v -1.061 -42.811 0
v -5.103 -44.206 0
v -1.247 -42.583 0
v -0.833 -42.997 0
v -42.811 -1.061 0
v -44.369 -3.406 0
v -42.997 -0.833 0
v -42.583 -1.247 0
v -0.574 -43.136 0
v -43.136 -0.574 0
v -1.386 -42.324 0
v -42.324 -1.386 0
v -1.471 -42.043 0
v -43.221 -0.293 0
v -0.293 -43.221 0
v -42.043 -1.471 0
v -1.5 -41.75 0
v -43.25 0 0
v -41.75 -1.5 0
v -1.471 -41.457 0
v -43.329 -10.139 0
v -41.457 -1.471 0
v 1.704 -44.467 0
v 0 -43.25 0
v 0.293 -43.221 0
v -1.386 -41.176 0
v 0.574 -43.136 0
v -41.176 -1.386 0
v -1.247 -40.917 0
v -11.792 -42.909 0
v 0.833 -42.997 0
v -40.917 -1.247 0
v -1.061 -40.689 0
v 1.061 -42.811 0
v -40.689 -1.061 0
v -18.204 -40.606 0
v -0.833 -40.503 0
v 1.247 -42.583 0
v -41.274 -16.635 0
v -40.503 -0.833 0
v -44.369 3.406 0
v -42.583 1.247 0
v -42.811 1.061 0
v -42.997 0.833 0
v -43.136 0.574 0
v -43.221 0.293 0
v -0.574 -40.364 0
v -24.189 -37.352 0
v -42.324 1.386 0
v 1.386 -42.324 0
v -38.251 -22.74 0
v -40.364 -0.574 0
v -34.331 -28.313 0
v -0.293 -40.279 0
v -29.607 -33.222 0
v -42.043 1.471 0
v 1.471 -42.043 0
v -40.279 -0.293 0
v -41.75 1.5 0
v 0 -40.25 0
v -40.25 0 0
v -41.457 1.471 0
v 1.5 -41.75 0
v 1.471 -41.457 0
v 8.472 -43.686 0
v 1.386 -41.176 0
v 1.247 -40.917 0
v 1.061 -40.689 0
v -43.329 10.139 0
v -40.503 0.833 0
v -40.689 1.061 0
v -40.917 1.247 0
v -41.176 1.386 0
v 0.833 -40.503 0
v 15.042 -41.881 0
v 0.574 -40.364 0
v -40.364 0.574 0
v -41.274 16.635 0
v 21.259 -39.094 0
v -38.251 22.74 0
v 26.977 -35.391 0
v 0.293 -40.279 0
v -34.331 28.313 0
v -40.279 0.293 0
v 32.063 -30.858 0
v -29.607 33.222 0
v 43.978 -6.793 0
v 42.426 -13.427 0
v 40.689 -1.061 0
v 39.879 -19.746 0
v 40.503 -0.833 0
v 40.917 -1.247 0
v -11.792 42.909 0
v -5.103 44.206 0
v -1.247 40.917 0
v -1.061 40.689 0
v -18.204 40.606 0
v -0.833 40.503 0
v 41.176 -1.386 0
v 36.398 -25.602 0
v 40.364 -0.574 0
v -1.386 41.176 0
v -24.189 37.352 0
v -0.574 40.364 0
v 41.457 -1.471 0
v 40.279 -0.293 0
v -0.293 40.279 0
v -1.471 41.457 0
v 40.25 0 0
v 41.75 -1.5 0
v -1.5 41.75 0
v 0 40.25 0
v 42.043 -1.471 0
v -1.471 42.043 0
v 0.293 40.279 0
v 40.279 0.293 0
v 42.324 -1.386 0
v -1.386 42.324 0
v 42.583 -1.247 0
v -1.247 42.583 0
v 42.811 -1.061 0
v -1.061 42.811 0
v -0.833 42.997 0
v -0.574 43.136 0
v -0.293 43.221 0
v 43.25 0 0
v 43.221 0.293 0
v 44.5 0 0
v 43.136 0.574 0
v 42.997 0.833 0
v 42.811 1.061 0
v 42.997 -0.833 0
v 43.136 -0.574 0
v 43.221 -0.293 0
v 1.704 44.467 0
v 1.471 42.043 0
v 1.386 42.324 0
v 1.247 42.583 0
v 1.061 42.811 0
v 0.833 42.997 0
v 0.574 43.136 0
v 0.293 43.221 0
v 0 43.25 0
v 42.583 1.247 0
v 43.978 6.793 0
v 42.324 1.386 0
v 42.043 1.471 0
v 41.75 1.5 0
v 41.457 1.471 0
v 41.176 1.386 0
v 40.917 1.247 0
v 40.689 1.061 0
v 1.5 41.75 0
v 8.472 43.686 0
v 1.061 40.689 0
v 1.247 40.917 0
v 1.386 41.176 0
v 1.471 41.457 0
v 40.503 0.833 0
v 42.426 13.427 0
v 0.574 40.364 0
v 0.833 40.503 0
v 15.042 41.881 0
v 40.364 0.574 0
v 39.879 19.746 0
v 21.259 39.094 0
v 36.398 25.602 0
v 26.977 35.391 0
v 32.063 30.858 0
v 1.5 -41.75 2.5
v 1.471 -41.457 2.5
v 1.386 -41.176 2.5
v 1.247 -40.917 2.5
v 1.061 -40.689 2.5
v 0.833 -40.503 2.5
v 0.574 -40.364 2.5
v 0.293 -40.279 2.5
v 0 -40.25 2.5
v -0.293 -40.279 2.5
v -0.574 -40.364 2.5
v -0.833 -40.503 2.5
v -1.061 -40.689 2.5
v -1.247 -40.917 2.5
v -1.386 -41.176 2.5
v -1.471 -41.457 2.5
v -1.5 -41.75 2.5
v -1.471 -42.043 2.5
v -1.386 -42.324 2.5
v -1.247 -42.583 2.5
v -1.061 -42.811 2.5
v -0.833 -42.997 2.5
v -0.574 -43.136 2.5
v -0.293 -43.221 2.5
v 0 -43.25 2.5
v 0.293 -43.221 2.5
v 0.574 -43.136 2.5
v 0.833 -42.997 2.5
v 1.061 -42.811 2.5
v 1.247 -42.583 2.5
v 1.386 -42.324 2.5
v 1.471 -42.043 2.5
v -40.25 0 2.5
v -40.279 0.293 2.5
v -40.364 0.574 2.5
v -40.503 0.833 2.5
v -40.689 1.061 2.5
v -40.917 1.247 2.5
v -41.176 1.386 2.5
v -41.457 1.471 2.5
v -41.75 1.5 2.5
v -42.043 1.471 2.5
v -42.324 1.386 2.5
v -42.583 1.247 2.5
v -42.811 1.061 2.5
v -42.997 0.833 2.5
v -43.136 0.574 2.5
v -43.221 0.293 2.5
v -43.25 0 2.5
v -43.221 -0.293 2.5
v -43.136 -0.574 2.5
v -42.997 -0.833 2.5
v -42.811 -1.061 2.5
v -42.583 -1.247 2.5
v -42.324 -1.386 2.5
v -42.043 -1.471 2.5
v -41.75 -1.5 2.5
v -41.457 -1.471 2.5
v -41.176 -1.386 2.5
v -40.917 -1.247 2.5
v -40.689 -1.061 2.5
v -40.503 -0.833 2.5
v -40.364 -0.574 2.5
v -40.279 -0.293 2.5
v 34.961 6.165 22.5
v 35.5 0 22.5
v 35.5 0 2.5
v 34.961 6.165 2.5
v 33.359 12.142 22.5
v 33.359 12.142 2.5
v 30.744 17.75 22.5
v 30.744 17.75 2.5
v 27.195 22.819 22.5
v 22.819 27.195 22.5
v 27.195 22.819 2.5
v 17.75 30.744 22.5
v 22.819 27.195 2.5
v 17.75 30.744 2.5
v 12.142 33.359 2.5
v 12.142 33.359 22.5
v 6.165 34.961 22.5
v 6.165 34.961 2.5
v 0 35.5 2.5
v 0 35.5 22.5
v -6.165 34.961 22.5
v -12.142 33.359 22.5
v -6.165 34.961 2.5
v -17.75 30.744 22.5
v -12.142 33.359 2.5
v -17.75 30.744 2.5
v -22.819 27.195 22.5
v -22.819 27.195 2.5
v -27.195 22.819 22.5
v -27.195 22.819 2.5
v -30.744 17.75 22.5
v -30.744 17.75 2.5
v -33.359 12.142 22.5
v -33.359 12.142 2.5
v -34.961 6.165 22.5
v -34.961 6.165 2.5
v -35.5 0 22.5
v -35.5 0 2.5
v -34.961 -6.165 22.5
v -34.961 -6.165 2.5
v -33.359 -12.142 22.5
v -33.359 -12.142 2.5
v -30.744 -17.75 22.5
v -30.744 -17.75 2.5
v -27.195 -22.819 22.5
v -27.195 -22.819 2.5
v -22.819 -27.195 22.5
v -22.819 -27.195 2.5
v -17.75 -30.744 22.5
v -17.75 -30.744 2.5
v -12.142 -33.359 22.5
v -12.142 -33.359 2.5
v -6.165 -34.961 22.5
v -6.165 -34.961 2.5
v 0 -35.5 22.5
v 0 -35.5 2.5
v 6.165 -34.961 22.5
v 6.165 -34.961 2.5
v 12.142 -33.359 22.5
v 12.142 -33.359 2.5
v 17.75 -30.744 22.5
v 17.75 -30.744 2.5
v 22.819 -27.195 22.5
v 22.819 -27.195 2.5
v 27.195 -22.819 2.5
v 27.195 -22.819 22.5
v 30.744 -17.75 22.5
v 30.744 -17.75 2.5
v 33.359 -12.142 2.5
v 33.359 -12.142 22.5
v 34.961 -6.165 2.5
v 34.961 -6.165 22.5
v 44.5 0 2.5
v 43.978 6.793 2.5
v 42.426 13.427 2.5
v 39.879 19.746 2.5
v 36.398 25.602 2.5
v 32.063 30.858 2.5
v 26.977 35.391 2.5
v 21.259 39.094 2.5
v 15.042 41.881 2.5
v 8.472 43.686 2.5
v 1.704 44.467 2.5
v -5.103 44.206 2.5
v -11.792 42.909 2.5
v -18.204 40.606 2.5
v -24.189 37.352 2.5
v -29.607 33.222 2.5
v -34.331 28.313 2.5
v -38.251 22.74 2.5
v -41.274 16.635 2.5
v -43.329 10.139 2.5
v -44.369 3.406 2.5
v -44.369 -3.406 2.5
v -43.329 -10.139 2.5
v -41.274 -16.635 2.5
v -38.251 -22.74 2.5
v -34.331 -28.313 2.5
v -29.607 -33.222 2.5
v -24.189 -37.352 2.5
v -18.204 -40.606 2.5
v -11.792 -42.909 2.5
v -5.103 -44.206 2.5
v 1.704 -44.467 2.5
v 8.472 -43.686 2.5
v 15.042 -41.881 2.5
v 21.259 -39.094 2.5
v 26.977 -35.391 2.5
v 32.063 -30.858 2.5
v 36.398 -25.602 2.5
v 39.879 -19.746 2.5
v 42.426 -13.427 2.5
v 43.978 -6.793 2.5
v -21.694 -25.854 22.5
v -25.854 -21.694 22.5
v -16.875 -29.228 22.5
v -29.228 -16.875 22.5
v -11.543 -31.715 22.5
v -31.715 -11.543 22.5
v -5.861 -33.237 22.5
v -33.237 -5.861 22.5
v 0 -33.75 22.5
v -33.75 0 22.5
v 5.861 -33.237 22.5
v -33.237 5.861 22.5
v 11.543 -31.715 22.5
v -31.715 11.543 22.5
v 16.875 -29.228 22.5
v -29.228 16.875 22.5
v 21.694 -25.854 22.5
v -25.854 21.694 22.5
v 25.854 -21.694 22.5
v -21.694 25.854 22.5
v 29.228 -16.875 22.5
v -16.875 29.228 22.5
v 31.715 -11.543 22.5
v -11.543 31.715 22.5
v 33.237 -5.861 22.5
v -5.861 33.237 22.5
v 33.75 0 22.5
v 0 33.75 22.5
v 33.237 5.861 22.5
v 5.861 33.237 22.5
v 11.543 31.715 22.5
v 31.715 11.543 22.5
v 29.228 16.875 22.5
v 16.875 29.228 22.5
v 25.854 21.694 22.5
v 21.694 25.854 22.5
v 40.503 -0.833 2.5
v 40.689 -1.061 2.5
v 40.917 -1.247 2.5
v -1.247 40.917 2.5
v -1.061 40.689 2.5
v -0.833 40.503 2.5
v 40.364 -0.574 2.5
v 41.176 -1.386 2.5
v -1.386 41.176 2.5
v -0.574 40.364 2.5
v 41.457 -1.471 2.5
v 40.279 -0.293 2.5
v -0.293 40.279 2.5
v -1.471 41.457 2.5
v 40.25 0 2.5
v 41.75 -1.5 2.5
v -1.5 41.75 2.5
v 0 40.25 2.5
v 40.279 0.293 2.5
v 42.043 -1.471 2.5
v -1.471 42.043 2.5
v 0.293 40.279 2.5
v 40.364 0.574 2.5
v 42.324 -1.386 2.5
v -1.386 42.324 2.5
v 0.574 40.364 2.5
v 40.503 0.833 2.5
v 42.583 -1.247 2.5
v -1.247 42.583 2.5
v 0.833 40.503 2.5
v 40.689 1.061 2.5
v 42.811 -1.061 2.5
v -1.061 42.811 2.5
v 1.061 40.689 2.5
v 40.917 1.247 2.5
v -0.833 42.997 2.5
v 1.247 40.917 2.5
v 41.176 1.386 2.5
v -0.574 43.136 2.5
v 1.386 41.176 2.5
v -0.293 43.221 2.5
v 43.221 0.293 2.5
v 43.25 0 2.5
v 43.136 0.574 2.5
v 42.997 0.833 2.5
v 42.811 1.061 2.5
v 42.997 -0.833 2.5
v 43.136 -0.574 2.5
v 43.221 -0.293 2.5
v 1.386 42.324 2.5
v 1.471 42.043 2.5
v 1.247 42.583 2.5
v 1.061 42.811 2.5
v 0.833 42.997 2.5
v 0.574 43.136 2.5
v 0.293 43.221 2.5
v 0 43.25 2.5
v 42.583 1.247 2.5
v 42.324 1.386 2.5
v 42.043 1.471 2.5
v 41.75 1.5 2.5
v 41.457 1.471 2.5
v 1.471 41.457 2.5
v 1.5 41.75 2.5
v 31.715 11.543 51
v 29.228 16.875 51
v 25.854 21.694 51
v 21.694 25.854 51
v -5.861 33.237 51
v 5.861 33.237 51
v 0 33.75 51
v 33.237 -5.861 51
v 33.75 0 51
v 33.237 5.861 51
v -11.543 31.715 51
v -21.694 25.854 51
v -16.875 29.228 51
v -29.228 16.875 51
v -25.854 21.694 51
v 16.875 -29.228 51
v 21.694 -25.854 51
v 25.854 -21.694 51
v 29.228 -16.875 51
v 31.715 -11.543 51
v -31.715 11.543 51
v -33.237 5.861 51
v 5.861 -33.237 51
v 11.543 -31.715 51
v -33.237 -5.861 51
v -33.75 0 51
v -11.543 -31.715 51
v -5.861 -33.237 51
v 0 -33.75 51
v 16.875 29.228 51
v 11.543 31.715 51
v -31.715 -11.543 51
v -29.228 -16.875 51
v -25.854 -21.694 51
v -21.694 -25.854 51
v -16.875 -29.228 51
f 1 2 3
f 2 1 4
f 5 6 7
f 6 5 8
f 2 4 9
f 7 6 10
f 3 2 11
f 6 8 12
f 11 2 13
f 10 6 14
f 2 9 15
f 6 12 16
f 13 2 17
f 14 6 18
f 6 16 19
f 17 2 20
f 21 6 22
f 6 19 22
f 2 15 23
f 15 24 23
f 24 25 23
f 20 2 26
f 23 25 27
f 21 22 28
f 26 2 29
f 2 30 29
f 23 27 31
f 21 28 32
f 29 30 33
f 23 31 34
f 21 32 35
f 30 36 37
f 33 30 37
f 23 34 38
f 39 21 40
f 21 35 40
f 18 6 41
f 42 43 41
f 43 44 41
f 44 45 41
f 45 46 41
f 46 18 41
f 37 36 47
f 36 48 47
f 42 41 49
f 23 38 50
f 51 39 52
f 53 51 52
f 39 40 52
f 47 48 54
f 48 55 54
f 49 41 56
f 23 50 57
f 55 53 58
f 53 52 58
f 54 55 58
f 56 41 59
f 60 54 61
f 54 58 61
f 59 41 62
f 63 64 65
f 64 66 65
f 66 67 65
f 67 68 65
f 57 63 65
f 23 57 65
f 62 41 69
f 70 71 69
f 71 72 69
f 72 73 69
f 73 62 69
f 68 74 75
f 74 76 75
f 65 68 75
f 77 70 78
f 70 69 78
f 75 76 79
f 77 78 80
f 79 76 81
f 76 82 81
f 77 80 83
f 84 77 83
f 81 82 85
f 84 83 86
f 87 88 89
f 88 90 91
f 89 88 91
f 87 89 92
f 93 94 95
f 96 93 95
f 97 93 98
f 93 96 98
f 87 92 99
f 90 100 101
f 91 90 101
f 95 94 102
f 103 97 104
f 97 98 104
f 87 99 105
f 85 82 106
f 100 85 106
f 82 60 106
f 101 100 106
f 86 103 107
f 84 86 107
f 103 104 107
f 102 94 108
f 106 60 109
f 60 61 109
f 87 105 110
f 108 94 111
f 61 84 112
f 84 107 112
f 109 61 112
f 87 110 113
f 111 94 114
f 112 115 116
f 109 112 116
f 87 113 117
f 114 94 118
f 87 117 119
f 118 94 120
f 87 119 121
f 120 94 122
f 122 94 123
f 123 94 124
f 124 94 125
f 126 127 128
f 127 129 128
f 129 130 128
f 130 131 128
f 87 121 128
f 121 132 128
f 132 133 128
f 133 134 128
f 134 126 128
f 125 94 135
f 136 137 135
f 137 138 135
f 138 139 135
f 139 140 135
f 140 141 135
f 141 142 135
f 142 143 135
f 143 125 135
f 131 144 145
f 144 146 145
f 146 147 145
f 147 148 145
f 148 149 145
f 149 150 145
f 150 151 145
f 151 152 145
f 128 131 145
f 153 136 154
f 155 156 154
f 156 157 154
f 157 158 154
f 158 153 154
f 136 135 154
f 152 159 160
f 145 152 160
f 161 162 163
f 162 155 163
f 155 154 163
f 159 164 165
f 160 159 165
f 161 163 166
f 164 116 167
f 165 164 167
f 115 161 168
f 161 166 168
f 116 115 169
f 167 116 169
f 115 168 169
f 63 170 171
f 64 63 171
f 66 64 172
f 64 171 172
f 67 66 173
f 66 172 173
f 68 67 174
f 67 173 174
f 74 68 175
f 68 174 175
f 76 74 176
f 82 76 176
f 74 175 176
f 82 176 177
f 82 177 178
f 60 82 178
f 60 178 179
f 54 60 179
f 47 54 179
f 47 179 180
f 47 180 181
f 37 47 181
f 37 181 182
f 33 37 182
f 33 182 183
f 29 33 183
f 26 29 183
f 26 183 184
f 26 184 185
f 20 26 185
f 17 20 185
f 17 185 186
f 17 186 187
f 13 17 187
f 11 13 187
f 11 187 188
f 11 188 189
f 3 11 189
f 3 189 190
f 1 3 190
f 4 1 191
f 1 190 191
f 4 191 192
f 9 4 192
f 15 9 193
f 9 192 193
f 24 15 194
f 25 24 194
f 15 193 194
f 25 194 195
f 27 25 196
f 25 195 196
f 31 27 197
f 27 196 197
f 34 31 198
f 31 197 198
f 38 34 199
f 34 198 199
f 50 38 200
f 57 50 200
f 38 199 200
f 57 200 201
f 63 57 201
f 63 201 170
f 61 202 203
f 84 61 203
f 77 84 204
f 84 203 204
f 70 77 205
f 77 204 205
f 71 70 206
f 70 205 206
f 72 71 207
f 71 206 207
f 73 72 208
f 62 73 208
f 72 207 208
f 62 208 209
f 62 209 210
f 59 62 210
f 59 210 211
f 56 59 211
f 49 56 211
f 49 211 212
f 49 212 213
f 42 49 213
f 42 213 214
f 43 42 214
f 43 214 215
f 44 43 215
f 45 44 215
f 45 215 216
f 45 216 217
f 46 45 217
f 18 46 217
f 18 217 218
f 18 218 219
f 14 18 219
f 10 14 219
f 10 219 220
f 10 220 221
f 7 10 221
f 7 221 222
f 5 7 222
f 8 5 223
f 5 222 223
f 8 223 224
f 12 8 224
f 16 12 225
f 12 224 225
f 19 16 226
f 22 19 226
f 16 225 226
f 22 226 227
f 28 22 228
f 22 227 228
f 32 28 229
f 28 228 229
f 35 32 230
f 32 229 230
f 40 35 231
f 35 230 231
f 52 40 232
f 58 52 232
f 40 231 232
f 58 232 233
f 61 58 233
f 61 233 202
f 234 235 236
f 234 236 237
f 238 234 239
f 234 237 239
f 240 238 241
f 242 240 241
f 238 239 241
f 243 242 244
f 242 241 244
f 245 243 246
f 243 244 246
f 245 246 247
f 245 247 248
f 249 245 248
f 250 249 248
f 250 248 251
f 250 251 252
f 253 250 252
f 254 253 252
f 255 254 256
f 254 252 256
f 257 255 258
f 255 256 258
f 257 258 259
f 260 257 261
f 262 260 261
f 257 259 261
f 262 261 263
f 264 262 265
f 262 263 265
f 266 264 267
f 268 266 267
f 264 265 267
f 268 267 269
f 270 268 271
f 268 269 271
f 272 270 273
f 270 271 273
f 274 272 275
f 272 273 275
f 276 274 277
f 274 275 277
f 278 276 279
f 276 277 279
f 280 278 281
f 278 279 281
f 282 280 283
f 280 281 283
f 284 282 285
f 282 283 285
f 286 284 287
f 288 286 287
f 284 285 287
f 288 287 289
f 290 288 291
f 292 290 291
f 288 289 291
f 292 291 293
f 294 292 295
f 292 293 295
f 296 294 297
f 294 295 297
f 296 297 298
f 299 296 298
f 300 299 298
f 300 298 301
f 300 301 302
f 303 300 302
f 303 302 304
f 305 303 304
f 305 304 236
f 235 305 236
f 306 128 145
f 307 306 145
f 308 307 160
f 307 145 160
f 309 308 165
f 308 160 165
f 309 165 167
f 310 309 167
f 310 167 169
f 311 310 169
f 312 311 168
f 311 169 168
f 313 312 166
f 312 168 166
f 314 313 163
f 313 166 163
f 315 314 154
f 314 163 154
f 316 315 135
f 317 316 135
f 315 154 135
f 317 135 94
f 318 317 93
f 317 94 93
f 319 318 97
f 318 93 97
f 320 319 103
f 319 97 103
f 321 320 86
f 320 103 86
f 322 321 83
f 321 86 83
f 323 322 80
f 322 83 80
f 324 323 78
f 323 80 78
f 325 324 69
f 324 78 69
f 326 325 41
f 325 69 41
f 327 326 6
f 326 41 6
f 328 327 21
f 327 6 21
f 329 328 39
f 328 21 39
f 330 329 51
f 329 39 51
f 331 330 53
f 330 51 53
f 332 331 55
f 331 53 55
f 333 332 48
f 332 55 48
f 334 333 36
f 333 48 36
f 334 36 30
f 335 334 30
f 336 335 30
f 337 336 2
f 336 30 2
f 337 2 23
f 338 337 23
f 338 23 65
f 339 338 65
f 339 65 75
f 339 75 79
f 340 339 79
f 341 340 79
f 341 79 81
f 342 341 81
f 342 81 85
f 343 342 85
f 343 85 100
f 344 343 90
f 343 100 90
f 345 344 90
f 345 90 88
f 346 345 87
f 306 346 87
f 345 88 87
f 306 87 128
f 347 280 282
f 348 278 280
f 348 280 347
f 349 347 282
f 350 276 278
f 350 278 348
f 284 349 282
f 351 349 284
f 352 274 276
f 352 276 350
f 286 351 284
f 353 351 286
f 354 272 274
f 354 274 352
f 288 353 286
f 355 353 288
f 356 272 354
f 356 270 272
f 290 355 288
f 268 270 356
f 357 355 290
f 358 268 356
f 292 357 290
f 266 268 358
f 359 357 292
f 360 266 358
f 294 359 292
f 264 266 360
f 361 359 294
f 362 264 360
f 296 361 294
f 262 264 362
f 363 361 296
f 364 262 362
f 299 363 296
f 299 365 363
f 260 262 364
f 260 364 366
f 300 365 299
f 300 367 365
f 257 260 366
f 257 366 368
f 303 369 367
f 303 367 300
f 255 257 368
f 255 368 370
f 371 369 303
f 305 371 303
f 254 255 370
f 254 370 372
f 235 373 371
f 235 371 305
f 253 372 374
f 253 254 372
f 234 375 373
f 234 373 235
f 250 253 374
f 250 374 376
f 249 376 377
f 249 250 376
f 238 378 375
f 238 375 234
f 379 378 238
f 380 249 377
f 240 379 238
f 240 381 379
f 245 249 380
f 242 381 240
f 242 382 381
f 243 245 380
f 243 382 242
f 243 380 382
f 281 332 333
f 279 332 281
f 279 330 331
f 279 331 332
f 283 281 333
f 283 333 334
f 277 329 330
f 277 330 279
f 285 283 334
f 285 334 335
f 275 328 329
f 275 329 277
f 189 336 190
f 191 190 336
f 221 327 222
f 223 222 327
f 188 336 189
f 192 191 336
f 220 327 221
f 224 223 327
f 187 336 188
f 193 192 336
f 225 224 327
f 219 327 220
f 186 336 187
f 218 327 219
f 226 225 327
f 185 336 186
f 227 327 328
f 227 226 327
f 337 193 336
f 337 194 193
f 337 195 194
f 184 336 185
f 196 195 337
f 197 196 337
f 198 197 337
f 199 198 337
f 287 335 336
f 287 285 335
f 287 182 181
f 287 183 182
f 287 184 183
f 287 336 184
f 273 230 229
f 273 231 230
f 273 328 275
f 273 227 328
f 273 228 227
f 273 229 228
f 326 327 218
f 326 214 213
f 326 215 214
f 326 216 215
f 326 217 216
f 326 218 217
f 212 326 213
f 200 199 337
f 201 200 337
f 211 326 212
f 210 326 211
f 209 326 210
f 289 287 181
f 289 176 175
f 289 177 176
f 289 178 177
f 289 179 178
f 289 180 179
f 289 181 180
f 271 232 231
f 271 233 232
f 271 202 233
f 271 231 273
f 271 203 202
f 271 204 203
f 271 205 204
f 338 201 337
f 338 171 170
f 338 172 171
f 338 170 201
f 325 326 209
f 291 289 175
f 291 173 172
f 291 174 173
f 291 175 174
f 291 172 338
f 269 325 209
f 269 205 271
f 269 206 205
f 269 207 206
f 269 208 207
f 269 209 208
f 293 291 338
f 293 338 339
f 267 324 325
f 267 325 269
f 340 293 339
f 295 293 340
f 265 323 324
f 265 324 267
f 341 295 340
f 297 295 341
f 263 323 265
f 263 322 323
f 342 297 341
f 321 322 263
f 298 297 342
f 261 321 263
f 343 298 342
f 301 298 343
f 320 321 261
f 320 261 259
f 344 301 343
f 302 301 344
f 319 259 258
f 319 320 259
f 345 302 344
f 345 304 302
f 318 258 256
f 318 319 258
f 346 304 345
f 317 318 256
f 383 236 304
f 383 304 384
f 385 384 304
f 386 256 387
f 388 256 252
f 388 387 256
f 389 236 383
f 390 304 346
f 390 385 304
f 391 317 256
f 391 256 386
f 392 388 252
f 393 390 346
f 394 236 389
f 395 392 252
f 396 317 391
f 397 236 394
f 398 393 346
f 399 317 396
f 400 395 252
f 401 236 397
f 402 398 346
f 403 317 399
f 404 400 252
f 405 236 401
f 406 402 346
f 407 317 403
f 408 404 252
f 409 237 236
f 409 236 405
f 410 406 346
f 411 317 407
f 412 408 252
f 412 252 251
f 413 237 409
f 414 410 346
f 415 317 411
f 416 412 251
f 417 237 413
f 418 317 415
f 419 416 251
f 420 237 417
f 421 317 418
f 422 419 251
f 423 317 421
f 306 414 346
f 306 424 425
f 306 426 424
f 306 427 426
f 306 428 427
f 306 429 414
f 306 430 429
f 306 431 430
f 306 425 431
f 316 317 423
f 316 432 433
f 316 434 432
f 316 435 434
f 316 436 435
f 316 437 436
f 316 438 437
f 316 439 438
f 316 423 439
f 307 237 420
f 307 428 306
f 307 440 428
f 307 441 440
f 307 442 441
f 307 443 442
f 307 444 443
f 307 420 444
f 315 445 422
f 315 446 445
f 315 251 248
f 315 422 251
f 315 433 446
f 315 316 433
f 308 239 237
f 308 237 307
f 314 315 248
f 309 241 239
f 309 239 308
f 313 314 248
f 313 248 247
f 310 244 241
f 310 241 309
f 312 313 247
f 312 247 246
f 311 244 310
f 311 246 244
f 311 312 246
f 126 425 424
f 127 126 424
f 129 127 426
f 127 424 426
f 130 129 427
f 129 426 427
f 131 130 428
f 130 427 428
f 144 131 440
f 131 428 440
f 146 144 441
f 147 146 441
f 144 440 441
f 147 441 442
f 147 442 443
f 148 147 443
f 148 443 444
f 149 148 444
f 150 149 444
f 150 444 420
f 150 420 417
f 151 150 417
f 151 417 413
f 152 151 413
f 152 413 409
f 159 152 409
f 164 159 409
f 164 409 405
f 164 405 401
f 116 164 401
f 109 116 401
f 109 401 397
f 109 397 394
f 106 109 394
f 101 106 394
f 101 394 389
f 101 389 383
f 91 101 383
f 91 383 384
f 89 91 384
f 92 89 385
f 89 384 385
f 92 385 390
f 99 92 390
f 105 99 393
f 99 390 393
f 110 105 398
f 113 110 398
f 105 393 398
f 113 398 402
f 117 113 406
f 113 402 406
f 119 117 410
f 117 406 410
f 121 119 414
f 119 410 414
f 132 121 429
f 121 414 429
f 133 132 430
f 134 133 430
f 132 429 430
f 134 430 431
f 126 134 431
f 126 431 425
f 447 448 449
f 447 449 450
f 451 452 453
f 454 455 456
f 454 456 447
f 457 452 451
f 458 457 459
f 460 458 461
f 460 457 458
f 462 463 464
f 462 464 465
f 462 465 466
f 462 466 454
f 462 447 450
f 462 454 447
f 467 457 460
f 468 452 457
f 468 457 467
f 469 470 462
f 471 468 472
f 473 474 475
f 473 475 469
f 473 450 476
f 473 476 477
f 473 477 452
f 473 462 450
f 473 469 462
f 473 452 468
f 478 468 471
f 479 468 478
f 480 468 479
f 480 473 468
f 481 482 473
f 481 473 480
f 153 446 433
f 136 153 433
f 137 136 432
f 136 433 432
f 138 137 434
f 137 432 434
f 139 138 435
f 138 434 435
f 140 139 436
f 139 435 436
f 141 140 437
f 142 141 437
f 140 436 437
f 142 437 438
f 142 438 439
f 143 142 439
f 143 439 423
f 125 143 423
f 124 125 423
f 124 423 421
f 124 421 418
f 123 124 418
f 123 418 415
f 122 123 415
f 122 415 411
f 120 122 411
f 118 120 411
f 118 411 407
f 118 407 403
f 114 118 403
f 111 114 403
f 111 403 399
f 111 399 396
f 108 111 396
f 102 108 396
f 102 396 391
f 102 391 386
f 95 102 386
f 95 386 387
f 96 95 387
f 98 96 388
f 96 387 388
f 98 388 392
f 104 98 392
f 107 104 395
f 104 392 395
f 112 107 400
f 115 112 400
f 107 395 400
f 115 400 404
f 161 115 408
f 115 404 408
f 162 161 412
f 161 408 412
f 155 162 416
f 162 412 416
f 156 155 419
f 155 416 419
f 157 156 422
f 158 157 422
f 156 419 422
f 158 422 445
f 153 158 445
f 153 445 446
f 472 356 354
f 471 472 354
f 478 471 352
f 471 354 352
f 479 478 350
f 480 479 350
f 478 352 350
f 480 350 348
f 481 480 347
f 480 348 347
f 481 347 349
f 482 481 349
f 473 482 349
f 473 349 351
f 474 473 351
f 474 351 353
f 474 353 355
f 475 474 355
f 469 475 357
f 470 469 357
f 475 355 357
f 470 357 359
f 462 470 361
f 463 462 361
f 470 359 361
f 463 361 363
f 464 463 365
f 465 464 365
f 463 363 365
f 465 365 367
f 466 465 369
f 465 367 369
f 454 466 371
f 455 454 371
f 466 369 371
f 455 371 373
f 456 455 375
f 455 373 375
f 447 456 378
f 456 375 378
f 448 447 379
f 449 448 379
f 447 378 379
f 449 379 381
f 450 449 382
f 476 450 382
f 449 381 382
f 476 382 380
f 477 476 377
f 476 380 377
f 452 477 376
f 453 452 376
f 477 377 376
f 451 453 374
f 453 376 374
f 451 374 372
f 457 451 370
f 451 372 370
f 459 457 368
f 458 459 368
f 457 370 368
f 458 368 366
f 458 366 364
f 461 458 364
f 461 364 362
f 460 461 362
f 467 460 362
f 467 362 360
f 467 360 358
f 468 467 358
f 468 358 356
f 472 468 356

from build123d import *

# Parameters (mm, degrees)
SKETCH1_R           = 44.5
BOSS_EXTRUDE1_DEPTH = 2.5
SKETCH2_R           = 1.5
CUT_EXTRUDE1_DEPTH  = 63.982140326
SKETCH3_R           = 35.5
BOSS_EXTRUDE2_DEPTH = 20
SKETCH4_R           = 33.75
BOSS_EXTRUDE3_DEPTH = 28.5


with BuildPart() as part:
    # Sketch1 → Boss-Extrude1 (new body)
    with BuildSketch(Plane.XY):
        Circle(SKETCH1_R)
    extrude(amount=BOSS_EXTRUDE1_DEPTH)

    # Sketch2 → Cut-Extrude1 (cut, through all)
    with BuildSketch(Plane.XY.offset(2.5)):
        with Locations((0, 41.75)):
            Circle(SKETCH2_R)
        with Locations((41.75, 0)):
            Circle(SKETCH2_R)
        with Locations((0, -41.75)):
            Circle(SKETCH2_R)
        with Locations((-41.75, 0)):
            Circle(SKETCH2_R)
    extrude(amount=-CUT_EXTRUDE1_DEPTH, mode=Mode.SUBTRACT)

    # Sketch3 → Boss-Extrude2 (add)
    with BuildSketch(Plane.XY.offset(2.5)):
        Circle(SKETCH3_R)
    extrude(amount=BOSS_EXTRUDE2_DEPTH)

    # Sketch4 → Boss-Extrude3 (add)
    with BuildSketch(Plane.XY.offset(22.5)):
        with Locations(Location((0, 0, 0), (0, 0, 180))):
            Circle(SKETCH4_R)
    extrude(amount=BOSS_EXTRUDE3_DEPTH)


solid = part.part
